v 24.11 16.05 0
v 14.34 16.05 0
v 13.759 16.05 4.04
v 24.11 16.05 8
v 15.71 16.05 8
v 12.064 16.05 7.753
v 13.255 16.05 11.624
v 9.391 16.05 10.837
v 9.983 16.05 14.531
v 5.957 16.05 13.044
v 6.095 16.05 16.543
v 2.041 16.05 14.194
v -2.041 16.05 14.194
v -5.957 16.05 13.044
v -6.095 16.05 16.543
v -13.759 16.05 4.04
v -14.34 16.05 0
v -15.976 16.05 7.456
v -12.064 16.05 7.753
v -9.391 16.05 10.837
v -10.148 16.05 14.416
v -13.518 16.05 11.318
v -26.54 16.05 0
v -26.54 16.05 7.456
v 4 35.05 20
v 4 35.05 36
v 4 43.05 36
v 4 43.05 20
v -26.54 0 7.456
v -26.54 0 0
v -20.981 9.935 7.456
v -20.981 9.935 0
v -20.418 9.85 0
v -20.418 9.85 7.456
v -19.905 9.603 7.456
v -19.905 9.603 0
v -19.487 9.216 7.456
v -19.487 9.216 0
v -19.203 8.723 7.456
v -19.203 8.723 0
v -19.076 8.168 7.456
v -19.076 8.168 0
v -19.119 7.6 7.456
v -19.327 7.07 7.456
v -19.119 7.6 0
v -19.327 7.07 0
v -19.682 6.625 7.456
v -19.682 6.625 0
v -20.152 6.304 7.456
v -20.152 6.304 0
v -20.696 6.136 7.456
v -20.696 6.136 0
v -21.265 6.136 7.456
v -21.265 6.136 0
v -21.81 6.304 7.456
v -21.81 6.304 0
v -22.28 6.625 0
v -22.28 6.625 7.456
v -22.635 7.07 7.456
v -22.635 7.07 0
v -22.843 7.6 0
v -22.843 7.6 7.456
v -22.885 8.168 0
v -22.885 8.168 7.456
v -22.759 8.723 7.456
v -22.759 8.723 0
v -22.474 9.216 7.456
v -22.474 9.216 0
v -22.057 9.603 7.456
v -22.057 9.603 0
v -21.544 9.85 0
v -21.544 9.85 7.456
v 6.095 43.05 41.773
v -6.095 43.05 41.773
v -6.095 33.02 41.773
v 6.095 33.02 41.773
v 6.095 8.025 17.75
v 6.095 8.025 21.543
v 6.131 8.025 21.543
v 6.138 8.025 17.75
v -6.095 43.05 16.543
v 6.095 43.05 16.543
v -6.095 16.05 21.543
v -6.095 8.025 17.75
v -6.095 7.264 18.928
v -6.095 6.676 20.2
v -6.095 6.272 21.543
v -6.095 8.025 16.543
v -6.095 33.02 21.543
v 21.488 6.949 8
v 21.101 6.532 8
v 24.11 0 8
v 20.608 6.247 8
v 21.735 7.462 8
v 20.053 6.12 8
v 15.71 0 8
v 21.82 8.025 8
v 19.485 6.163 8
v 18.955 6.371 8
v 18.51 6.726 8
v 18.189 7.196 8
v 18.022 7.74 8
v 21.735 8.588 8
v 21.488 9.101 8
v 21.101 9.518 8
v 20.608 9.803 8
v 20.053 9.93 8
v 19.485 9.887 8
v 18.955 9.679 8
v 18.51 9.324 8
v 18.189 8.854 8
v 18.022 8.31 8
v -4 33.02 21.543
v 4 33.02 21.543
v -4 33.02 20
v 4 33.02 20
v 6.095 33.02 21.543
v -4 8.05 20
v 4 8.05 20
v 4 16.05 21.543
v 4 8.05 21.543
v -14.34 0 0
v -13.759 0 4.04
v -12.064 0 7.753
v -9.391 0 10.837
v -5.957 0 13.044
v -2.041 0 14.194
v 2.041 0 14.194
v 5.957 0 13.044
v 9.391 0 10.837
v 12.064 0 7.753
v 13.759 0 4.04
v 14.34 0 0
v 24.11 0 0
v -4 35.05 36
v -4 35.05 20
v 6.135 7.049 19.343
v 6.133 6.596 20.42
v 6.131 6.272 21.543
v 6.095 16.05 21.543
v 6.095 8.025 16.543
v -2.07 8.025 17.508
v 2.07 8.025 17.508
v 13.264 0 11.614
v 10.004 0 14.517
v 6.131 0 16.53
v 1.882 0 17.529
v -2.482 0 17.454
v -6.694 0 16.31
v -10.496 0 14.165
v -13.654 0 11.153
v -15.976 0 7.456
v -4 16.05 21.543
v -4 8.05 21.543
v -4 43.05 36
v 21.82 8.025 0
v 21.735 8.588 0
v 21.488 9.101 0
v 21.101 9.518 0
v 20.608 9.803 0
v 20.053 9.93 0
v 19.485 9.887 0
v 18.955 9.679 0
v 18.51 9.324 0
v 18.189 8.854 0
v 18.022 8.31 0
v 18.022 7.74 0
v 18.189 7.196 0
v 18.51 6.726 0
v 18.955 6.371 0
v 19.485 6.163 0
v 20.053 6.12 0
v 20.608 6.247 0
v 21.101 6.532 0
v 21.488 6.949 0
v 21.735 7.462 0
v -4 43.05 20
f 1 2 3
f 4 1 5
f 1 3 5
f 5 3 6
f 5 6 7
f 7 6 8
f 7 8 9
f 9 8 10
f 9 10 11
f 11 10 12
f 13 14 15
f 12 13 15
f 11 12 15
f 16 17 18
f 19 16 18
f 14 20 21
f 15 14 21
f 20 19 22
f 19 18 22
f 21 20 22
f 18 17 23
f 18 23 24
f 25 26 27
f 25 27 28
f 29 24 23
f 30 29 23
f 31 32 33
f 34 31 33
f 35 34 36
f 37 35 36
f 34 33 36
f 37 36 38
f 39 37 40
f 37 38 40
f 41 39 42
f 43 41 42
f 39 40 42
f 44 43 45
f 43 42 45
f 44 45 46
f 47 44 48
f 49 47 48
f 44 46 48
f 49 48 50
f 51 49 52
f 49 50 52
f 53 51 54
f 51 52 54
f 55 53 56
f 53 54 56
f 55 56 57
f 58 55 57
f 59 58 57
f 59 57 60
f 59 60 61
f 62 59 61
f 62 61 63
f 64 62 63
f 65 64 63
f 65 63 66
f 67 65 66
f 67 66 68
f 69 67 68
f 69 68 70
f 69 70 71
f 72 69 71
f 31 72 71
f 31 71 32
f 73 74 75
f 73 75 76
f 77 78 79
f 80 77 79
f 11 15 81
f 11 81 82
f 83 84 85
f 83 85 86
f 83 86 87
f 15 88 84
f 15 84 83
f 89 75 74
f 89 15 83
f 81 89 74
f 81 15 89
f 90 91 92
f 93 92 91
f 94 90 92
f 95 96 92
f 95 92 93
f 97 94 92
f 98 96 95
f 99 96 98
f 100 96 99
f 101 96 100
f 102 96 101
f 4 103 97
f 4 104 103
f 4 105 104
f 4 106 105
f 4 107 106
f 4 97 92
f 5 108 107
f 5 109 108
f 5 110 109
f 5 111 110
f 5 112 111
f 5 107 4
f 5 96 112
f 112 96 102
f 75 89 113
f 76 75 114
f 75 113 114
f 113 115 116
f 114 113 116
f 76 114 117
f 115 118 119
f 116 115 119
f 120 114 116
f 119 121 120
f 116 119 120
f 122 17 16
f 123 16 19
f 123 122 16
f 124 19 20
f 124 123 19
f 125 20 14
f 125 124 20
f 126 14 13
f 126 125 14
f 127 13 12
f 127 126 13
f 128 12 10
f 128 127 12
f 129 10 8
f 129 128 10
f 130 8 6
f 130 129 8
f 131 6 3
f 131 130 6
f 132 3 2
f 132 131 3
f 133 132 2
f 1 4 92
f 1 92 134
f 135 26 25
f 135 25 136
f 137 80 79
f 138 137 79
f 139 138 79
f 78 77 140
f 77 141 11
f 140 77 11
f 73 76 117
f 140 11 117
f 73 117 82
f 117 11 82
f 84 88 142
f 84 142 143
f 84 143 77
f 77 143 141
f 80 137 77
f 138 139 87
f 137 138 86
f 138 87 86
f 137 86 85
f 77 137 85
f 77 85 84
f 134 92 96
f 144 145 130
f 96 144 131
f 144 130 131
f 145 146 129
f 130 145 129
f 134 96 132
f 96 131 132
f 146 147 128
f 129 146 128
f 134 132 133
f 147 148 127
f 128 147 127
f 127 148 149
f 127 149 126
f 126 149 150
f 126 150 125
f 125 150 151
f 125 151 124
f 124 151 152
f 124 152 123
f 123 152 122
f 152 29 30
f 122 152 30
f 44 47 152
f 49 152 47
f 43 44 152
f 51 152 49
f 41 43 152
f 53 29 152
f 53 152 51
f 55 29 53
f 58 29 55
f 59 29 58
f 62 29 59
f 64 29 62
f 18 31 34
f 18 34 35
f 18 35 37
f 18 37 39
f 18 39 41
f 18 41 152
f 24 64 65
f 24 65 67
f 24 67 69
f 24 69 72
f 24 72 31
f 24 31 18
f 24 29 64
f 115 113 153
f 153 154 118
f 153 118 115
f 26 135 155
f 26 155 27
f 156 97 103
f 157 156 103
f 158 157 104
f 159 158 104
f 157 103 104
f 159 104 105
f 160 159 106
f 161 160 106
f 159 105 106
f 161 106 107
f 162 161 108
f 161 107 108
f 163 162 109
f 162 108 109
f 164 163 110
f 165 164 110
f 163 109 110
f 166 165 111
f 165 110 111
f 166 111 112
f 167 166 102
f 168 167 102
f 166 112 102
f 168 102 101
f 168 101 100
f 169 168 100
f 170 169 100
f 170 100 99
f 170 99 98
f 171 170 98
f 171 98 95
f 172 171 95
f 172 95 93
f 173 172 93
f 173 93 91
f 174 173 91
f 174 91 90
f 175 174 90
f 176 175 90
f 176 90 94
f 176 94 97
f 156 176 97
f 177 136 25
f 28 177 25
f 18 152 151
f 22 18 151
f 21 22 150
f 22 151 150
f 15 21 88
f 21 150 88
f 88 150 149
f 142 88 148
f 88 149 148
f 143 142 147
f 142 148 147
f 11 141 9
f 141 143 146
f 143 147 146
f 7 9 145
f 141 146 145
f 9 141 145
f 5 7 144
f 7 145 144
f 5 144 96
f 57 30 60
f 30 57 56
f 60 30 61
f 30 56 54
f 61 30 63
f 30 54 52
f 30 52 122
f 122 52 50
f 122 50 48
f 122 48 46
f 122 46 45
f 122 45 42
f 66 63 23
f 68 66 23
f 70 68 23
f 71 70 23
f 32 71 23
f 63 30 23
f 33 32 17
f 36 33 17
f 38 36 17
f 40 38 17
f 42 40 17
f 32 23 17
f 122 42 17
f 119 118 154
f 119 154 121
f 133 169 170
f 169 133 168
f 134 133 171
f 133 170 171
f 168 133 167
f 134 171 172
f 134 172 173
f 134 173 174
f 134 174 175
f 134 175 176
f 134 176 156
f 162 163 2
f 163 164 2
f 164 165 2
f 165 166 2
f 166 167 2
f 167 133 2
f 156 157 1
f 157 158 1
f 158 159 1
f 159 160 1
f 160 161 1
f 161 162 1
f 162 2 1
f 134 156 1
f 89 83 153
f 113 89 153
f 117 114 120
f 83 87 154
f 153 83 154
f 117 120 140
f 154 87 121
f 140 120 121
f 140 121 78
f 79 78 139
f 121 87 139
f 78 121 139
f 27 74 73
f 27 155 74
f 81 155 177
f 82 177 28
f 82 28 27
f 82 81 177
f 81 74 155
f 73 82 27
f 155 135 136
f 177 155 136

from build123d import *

# Parameters (mm, degrees)
SKETCH_1_R                = 17.63
SKETCH_1_R_2              = 14.34
EXTRUDE_1_DEPTH           = 16.05
EXTRUDE_1_2_DEPTH         = 9.77
EXTRUDE_1_2_DEPTH_BACK    = 3
SKETCH_2_W                = 16
SKETCH_2_H                = 16.05
SKETCH_3_W                = 3.41
SKETCH_3_H                = 16
CUT_EXTRUDE_1_DEPTH       = 37.411121927
SKETCH_4_R                = 1.91
CUT_EXTRUDE_2_DEPTH       = 39.675463798
EXTRUDE_2_DEPTH           = 4
EXTRUDE_2_DEPTH_BACK      = 2.77
SKETCH_5_W                = 12.19
SKETCH_5_H                = 8.263625949
SKETCH_6_W                = 12.19
SKETCH_6_H                = 6.77
EXTRUDE_3_DEPTH           = 63
SKETCH_8_W                = 12.19
SKETCH_8_H                = 6.77
EXTRUDE_4_DEPTH           = 0.16
EXTRUDE_5_DEPTH           = 3.16
EXTRUDE_5_DEPTH_BACK      = 10
SKETCH_12_W               = 16
SKETCH_12_H               = 16.05
SKETCH_13_W               = 1.21
SKETCH_13_H               = 16
CUT_EXTRUDE_3_DEPTH       = 73.543164889
SKETCH_14_R               = 1.91
CUT_EXTRUDE_4_DEPTH       = 90.07387176
SKETCH_15_R               = 4.05
CUT_EXTRUDE_5_DEPTH       = 24
SKETCH_16_W               = 56.400519221
SKETCH_16_H               = 19.935010357
CUT_EXTRUDE_6_DEPTH       = 73.088971918
SKETCH_17_W               = 12.19
SKETCH_17_H               = 71.423625949
EXTRUDE_7_DEPTH           = 25
SKETCH_18_W               = 26.793372528
SKETCH_18_H               = 63.398625949
CUT_EXTRUDE_7_DEPTH       = 25
SKETCH_19_R               = 4
CUT_EXTRUDE_8_DEPTH       = 24
CUT_EXTRUDE_9_DEPTH       = 29
EXTRUDE_9_DEPTH           = 2
FILLET_1_R                = 10
SKETCH_24_W               = 12.19
SKETCH_24_H               = 5
EXTRUDE_10_DEPTH          = 27
SKETCH_27_W               = 12.19
SKETCH_27_H               = 10.03
EXTRUDE_11_DEPTH          = 20.23
CUT_EXTRUDE_10_DEPTH      = 45.23
CUT_EXTRUDE_10_DEPTH_BACK = 8
SKETCH_21_W               = 8
SKETCH_21_H               = 16
SKETCH_25_W               = 20.230462415
SKETCH_25_H               = 10.025
CUT_EXTRUDE_12_DEPTH      = 20.23
SKETCH_31_W               = 8
SKETCH_31_H               = 2.03
EXTRUDE_13_DEPTH          = 16.23


with BuildPart() as part:
    # 草圖1 → Extrude 1 (new body)
    with BuildSketch(Plane(origin=(0, 0, 0), x_dir=(1, 0, 0), z_dir=(0, 1, 0))):
        Circle(SKETCH_1_R)
        Circle(SKETCH_1_R_2, mode=Mode.SUBTRACT)
    extrude(amount=EXTRUDE_1_DEPTH)

    # 草圖2 → Extrude 1 2 (add, two sides: drawn at the far end of the back side and taken through both)
    with BuildSketch(Plane(origin=(17.75, 0, 0), x_dir=(0, 0, -1), z_dir=(1, 0, 0)).offset(-EXTRUDE_1_2_DEPTH_BACK)):
        with Locations((0, 8.025)):
            Rectangle(SKETCH_2_W, SKETCH_2_H)
    extrude(amount=EXTRUDE_1_2_DEPTH + EXTRUDE_1_2_DEPTH_BACK)

    # 草圖3 → 除料-伸長1 (cut, through all)
    with BuildSketch(Plane(origin=(0, 16.05, 0), x_dir=(1, 0, 0), z_dir=(0, 1, 0))):
        with Locations((25.815, 0)):
            Rectangle(SKETCH_3_W, SKETCH_3_H)
    extrude(amount=-CUT_EXTRUDE_1_DEPTH, mode=Mode.SUBTRACT)

    # 草圖4 → 除料-伸長2 (cut, through all)
    with BuildSketch(Plane.XY.offset(8)):
        with Locations((19.910203689, 8.025)):
            Circle(SKETCH_4_R)
    extrude(amount=-CUT_EXTRUDE_2_DEPTH, mode=Mode.SUBTRACT)

    # 草圖5 → 填料-伸長2 (add, two sides: drawn at the far end of the back side and taken through both)
    with BuildSketch(Plane.XY.offset(17.75).offset(-EXTRUDE_2_DEPTH_BACK)):
        with Locations((0, 12.156812974)):
            Rectangle(SKETCH_5_W, SKETCH_5_H)
    extrude(amount=EXTRUDE_2_DEPTH + EXTRUDE_2_DEPTH_BACK)

    # 草圖6 → 填料-伸長3 (add)
    with BuildSketch(Plane(origin=(0, 16.288625949, 0), x_dir=(1, 0, 0), z_dir=(0, 1, 0))):
        with Locations((0, -18.365)):
            Rectangle(SKETCH_6_W, SKETCH_6_H)
    extrude(amount=EXTRUDE_3_DEPTH)

    # 草圖8 → 填料-伸長4 (add)
    with BuildSketch(Plane(origin=(0, 79.288625949, 0), x_dir=(1, 0, 0), z_dir=(0, 1, 0))):
        with Locations((0, -18.365)):
            Rectangle(SKETCH_8_W, SKETCH_8_H)
    extrude(amount=EXTRUDE_4_DEPTH)

    # 草圖12 → 填料-伸長5 (add, two sides: drawn at the far end of the back side and taken through both)
    with BuildSketch(Plane(origin=(-17.75, 0, 0), x_dir=(0, 0, -1), z_dir=(1, 0, 0)).offset(-EXTRUDE_5_DEPTH_BACK)):
        with Locations((0.543544944, 8.025)):
            Rectangle(SKETCH_12_W, SKETCH_12_H)
    extrude(amount=EXTRUDE_5_DEPTH + EXTRUDE_5_DEPTH_BACK)

    # 草圖13 → 除料-伸長3 (cut, through all)
    with BuildSketch(Plane(origin=(0, 16.05, 0), x_dir=(1, 0, 0), z_dir=(0, 1, 0))):
        with Locations((-27.145, 0.543544944)):
            Rectangle(SKETCH_13_W, SKETCH_13_H)
    extrude(amount=-CUT_EXTRUDE_3_DEPTH, mode=Mode.SUBTRACT)

    # 草圖14 → 除料-伸長4 (cut, through all)
    with BuildSketch(Plane(origin=(0, 0, -8.543544944), x_dir=(-1, 0, 0), z_dir=(0, 0, -1))):
        with Locations(Location((20.980783679, 8.025, 0), (0, 0, 90))):
            Circle(SKETCH_14_R)
    extrude(amount=-CUT_EXTRUDE_4_DEPTH, mode=Mode.SUBTRACT)

    # 草圖15 → 除料-伸長5 (cut)
    with BuildSketch(Plane(origin=(0, 79.448625949, 0), x_dir=(1, 0, 0), z_dir=(0, 1, 0))):
        with Locations((0, -14.98)):
            Circle(SKETCH_15_R)
    extrude(amount=-CUT_EXTRUDE_5_DEPTH, mode=Mode.SUBTRACT)

    # 草圖16 → 除料-伸長6 (cut, through all)
    with BuildSketch(Plane(origin=(0, 16.05, 0), x_dir=(1, 0, 0), z_dir=(0, 1, 0))):
        with Locations((-4.090259611, 9.967505179)):
            Rectangle(SKETCH_16_W, SKETCH_16_H)
    extrude(amount=-CUT_EXTRUDE_6_DEPTH, mode=Mode.SUBTRACT)

    # 草圖17 → 填料-伸長7 (add)
    with BuildSketch(Plane.XY.offset(21.75)):
        with Locations((0, 43.736812975)):
            Rectangle(SKETCH_17_W, SKETCH_17_H)
    extrude(amount=EXTRUDE_7_DEPTH)

    # 草圖18 → 除料-伸長7 (cut)
    with BuildSketch(Plane.ZY.offset(6.095)):
        with Locations((28.376686264, 47.749312975)):
            Rectangle(SKETCH_18_W, SKETCH_18_H)
    extrude(amount=-CUT_EXTRUDE_7_DEPTH, mode=Mode.SUBTRACT)

    # 草圖19 → 除料-伸長8 (cut)
    with BuildSketch(Plane(origin=(0, 79.448625949, 0), x_dir=(1, 0, 0), z_dir=(0, 1, 0))):
        with Locations((0, -41.773372528)):
            Circle(SKETCH_19_R)
    extrude(amount=-CUT_EXTRUDE_8_DEPTH, mode=Mode.SUBTRACT)

    # 草圖20 → 除料-伸長9 (cut)
    with BuildSketch(Plane(origin=(6.095, 0, 0), x_dir=(0, 0, -1), z_dir=(1, 0, 0))):
        Polygon((-41.773372528, 16.05), (-41.773372528, 8.025), (-46.75, 8.025), (-46.75, 79.448625949), (-41.773372528, 79.448625949), align=None)
    extrude(amount=-CUT_EXTRUDE_9_DEPTH, mode=Mode.SUBTRACT)

    # 草圖23 → 填料-伸長9 (add)
    with BuildSketch(Plane.XZ.offset(-8.025)):
        Polygon((-6.095, 41.773372528), (-6.095, 17.75), (6.13829314, 17.75), (6.095, 41.773372528), align=None)
    extrude(amount=EXTRUDE_9_DEPTH)

    # 圓角1
    # the kernel refuses this fillet: 10 mm, written as the material it takes off along each edge
    with BuildSketch(Plane(origin=(-21.095, 6.025, 17.75), x_dir=(0, 1, 0), z_dir=(1, 0, 0))) as fillet_1_piece_1:
        with BuildLine():
            CenterArc((10, 6), FILLET_1_R, 180, 36.869897646)
            Line((0, 6), (0, 0))
            Line((0, 0), (2, 0))
        make_face()
    extrude(amount=42.23329314, mode=Mode.SUBTRACT)

    # 草圖24 → 填料-伸長10 (add)
    with BuildSketch(Plane(origin=(0, 16.05, 0), x_dir=(1, 0, 0), z_dir=(0, 1, 0))):
        with Locations((0, -19.042910113)):
            Rectangle(SKETCH_24_W, SKETCH_24_H)
    extrude(amount=EXTRUDE_10_DEPTH)

    # 草圖27 → 填料-伸長11 (add)
    with BuildSketch(Plane.XY.offset(21.542910113)):
        with Locations((0, 38.035)):
            Rectangle(SKETCH_27_W, SKETCH_27_H)
    extrude(amount=EXTRUDE_11_DEPTH)

    # 草圖21 → 除料-伸長10 (cut, two sides: drawn at the far end of the back side and taken through both)
    with BuildSketch(Plane(origin=(0, 16.05, 0), x_dir=(1, 0, 0), z_dir=(0, 1, 0)).offset(-CUT_EXTRUDE_10_DEPTH_BACK)):
        with Locations((0, -28)):
            Rectangle(SKETCH_21_W, SKETCH_21_H)
    extrude(amount=CUT_EXTRUDE_10_DEPTH + CUT_EXTRUDE_10_DEPTH_BACK, mode=Mode.SUBTRACT)

    # 草圖25 → 除料-伸長12 (cut)
    with BuildSketch(Plane.ZY.offset(6.095)):
        with Locations((31.658141321, 11.0375)):
            Rectangle(SKETCH_25_W, SKETCH_25_H)
    extrude(amount=-CUT_EXTRUDE_12_DEPTH, mode=Mode.SUBTRACT)

    # 草圖31 → 填料-伸長13 (add)
    with BuildSketch(Plane(origin=(0, 0, 36), x_dir=(-1, 0, 0), z_dir=(0, 0, -1))):
        with Locations((0, 34.035)):
            Rectangle(SKETCH_31_W, SKETCH_31_H)
    extrude(amount=EXTRUDE_13_DEPTH)


solid = part.part
